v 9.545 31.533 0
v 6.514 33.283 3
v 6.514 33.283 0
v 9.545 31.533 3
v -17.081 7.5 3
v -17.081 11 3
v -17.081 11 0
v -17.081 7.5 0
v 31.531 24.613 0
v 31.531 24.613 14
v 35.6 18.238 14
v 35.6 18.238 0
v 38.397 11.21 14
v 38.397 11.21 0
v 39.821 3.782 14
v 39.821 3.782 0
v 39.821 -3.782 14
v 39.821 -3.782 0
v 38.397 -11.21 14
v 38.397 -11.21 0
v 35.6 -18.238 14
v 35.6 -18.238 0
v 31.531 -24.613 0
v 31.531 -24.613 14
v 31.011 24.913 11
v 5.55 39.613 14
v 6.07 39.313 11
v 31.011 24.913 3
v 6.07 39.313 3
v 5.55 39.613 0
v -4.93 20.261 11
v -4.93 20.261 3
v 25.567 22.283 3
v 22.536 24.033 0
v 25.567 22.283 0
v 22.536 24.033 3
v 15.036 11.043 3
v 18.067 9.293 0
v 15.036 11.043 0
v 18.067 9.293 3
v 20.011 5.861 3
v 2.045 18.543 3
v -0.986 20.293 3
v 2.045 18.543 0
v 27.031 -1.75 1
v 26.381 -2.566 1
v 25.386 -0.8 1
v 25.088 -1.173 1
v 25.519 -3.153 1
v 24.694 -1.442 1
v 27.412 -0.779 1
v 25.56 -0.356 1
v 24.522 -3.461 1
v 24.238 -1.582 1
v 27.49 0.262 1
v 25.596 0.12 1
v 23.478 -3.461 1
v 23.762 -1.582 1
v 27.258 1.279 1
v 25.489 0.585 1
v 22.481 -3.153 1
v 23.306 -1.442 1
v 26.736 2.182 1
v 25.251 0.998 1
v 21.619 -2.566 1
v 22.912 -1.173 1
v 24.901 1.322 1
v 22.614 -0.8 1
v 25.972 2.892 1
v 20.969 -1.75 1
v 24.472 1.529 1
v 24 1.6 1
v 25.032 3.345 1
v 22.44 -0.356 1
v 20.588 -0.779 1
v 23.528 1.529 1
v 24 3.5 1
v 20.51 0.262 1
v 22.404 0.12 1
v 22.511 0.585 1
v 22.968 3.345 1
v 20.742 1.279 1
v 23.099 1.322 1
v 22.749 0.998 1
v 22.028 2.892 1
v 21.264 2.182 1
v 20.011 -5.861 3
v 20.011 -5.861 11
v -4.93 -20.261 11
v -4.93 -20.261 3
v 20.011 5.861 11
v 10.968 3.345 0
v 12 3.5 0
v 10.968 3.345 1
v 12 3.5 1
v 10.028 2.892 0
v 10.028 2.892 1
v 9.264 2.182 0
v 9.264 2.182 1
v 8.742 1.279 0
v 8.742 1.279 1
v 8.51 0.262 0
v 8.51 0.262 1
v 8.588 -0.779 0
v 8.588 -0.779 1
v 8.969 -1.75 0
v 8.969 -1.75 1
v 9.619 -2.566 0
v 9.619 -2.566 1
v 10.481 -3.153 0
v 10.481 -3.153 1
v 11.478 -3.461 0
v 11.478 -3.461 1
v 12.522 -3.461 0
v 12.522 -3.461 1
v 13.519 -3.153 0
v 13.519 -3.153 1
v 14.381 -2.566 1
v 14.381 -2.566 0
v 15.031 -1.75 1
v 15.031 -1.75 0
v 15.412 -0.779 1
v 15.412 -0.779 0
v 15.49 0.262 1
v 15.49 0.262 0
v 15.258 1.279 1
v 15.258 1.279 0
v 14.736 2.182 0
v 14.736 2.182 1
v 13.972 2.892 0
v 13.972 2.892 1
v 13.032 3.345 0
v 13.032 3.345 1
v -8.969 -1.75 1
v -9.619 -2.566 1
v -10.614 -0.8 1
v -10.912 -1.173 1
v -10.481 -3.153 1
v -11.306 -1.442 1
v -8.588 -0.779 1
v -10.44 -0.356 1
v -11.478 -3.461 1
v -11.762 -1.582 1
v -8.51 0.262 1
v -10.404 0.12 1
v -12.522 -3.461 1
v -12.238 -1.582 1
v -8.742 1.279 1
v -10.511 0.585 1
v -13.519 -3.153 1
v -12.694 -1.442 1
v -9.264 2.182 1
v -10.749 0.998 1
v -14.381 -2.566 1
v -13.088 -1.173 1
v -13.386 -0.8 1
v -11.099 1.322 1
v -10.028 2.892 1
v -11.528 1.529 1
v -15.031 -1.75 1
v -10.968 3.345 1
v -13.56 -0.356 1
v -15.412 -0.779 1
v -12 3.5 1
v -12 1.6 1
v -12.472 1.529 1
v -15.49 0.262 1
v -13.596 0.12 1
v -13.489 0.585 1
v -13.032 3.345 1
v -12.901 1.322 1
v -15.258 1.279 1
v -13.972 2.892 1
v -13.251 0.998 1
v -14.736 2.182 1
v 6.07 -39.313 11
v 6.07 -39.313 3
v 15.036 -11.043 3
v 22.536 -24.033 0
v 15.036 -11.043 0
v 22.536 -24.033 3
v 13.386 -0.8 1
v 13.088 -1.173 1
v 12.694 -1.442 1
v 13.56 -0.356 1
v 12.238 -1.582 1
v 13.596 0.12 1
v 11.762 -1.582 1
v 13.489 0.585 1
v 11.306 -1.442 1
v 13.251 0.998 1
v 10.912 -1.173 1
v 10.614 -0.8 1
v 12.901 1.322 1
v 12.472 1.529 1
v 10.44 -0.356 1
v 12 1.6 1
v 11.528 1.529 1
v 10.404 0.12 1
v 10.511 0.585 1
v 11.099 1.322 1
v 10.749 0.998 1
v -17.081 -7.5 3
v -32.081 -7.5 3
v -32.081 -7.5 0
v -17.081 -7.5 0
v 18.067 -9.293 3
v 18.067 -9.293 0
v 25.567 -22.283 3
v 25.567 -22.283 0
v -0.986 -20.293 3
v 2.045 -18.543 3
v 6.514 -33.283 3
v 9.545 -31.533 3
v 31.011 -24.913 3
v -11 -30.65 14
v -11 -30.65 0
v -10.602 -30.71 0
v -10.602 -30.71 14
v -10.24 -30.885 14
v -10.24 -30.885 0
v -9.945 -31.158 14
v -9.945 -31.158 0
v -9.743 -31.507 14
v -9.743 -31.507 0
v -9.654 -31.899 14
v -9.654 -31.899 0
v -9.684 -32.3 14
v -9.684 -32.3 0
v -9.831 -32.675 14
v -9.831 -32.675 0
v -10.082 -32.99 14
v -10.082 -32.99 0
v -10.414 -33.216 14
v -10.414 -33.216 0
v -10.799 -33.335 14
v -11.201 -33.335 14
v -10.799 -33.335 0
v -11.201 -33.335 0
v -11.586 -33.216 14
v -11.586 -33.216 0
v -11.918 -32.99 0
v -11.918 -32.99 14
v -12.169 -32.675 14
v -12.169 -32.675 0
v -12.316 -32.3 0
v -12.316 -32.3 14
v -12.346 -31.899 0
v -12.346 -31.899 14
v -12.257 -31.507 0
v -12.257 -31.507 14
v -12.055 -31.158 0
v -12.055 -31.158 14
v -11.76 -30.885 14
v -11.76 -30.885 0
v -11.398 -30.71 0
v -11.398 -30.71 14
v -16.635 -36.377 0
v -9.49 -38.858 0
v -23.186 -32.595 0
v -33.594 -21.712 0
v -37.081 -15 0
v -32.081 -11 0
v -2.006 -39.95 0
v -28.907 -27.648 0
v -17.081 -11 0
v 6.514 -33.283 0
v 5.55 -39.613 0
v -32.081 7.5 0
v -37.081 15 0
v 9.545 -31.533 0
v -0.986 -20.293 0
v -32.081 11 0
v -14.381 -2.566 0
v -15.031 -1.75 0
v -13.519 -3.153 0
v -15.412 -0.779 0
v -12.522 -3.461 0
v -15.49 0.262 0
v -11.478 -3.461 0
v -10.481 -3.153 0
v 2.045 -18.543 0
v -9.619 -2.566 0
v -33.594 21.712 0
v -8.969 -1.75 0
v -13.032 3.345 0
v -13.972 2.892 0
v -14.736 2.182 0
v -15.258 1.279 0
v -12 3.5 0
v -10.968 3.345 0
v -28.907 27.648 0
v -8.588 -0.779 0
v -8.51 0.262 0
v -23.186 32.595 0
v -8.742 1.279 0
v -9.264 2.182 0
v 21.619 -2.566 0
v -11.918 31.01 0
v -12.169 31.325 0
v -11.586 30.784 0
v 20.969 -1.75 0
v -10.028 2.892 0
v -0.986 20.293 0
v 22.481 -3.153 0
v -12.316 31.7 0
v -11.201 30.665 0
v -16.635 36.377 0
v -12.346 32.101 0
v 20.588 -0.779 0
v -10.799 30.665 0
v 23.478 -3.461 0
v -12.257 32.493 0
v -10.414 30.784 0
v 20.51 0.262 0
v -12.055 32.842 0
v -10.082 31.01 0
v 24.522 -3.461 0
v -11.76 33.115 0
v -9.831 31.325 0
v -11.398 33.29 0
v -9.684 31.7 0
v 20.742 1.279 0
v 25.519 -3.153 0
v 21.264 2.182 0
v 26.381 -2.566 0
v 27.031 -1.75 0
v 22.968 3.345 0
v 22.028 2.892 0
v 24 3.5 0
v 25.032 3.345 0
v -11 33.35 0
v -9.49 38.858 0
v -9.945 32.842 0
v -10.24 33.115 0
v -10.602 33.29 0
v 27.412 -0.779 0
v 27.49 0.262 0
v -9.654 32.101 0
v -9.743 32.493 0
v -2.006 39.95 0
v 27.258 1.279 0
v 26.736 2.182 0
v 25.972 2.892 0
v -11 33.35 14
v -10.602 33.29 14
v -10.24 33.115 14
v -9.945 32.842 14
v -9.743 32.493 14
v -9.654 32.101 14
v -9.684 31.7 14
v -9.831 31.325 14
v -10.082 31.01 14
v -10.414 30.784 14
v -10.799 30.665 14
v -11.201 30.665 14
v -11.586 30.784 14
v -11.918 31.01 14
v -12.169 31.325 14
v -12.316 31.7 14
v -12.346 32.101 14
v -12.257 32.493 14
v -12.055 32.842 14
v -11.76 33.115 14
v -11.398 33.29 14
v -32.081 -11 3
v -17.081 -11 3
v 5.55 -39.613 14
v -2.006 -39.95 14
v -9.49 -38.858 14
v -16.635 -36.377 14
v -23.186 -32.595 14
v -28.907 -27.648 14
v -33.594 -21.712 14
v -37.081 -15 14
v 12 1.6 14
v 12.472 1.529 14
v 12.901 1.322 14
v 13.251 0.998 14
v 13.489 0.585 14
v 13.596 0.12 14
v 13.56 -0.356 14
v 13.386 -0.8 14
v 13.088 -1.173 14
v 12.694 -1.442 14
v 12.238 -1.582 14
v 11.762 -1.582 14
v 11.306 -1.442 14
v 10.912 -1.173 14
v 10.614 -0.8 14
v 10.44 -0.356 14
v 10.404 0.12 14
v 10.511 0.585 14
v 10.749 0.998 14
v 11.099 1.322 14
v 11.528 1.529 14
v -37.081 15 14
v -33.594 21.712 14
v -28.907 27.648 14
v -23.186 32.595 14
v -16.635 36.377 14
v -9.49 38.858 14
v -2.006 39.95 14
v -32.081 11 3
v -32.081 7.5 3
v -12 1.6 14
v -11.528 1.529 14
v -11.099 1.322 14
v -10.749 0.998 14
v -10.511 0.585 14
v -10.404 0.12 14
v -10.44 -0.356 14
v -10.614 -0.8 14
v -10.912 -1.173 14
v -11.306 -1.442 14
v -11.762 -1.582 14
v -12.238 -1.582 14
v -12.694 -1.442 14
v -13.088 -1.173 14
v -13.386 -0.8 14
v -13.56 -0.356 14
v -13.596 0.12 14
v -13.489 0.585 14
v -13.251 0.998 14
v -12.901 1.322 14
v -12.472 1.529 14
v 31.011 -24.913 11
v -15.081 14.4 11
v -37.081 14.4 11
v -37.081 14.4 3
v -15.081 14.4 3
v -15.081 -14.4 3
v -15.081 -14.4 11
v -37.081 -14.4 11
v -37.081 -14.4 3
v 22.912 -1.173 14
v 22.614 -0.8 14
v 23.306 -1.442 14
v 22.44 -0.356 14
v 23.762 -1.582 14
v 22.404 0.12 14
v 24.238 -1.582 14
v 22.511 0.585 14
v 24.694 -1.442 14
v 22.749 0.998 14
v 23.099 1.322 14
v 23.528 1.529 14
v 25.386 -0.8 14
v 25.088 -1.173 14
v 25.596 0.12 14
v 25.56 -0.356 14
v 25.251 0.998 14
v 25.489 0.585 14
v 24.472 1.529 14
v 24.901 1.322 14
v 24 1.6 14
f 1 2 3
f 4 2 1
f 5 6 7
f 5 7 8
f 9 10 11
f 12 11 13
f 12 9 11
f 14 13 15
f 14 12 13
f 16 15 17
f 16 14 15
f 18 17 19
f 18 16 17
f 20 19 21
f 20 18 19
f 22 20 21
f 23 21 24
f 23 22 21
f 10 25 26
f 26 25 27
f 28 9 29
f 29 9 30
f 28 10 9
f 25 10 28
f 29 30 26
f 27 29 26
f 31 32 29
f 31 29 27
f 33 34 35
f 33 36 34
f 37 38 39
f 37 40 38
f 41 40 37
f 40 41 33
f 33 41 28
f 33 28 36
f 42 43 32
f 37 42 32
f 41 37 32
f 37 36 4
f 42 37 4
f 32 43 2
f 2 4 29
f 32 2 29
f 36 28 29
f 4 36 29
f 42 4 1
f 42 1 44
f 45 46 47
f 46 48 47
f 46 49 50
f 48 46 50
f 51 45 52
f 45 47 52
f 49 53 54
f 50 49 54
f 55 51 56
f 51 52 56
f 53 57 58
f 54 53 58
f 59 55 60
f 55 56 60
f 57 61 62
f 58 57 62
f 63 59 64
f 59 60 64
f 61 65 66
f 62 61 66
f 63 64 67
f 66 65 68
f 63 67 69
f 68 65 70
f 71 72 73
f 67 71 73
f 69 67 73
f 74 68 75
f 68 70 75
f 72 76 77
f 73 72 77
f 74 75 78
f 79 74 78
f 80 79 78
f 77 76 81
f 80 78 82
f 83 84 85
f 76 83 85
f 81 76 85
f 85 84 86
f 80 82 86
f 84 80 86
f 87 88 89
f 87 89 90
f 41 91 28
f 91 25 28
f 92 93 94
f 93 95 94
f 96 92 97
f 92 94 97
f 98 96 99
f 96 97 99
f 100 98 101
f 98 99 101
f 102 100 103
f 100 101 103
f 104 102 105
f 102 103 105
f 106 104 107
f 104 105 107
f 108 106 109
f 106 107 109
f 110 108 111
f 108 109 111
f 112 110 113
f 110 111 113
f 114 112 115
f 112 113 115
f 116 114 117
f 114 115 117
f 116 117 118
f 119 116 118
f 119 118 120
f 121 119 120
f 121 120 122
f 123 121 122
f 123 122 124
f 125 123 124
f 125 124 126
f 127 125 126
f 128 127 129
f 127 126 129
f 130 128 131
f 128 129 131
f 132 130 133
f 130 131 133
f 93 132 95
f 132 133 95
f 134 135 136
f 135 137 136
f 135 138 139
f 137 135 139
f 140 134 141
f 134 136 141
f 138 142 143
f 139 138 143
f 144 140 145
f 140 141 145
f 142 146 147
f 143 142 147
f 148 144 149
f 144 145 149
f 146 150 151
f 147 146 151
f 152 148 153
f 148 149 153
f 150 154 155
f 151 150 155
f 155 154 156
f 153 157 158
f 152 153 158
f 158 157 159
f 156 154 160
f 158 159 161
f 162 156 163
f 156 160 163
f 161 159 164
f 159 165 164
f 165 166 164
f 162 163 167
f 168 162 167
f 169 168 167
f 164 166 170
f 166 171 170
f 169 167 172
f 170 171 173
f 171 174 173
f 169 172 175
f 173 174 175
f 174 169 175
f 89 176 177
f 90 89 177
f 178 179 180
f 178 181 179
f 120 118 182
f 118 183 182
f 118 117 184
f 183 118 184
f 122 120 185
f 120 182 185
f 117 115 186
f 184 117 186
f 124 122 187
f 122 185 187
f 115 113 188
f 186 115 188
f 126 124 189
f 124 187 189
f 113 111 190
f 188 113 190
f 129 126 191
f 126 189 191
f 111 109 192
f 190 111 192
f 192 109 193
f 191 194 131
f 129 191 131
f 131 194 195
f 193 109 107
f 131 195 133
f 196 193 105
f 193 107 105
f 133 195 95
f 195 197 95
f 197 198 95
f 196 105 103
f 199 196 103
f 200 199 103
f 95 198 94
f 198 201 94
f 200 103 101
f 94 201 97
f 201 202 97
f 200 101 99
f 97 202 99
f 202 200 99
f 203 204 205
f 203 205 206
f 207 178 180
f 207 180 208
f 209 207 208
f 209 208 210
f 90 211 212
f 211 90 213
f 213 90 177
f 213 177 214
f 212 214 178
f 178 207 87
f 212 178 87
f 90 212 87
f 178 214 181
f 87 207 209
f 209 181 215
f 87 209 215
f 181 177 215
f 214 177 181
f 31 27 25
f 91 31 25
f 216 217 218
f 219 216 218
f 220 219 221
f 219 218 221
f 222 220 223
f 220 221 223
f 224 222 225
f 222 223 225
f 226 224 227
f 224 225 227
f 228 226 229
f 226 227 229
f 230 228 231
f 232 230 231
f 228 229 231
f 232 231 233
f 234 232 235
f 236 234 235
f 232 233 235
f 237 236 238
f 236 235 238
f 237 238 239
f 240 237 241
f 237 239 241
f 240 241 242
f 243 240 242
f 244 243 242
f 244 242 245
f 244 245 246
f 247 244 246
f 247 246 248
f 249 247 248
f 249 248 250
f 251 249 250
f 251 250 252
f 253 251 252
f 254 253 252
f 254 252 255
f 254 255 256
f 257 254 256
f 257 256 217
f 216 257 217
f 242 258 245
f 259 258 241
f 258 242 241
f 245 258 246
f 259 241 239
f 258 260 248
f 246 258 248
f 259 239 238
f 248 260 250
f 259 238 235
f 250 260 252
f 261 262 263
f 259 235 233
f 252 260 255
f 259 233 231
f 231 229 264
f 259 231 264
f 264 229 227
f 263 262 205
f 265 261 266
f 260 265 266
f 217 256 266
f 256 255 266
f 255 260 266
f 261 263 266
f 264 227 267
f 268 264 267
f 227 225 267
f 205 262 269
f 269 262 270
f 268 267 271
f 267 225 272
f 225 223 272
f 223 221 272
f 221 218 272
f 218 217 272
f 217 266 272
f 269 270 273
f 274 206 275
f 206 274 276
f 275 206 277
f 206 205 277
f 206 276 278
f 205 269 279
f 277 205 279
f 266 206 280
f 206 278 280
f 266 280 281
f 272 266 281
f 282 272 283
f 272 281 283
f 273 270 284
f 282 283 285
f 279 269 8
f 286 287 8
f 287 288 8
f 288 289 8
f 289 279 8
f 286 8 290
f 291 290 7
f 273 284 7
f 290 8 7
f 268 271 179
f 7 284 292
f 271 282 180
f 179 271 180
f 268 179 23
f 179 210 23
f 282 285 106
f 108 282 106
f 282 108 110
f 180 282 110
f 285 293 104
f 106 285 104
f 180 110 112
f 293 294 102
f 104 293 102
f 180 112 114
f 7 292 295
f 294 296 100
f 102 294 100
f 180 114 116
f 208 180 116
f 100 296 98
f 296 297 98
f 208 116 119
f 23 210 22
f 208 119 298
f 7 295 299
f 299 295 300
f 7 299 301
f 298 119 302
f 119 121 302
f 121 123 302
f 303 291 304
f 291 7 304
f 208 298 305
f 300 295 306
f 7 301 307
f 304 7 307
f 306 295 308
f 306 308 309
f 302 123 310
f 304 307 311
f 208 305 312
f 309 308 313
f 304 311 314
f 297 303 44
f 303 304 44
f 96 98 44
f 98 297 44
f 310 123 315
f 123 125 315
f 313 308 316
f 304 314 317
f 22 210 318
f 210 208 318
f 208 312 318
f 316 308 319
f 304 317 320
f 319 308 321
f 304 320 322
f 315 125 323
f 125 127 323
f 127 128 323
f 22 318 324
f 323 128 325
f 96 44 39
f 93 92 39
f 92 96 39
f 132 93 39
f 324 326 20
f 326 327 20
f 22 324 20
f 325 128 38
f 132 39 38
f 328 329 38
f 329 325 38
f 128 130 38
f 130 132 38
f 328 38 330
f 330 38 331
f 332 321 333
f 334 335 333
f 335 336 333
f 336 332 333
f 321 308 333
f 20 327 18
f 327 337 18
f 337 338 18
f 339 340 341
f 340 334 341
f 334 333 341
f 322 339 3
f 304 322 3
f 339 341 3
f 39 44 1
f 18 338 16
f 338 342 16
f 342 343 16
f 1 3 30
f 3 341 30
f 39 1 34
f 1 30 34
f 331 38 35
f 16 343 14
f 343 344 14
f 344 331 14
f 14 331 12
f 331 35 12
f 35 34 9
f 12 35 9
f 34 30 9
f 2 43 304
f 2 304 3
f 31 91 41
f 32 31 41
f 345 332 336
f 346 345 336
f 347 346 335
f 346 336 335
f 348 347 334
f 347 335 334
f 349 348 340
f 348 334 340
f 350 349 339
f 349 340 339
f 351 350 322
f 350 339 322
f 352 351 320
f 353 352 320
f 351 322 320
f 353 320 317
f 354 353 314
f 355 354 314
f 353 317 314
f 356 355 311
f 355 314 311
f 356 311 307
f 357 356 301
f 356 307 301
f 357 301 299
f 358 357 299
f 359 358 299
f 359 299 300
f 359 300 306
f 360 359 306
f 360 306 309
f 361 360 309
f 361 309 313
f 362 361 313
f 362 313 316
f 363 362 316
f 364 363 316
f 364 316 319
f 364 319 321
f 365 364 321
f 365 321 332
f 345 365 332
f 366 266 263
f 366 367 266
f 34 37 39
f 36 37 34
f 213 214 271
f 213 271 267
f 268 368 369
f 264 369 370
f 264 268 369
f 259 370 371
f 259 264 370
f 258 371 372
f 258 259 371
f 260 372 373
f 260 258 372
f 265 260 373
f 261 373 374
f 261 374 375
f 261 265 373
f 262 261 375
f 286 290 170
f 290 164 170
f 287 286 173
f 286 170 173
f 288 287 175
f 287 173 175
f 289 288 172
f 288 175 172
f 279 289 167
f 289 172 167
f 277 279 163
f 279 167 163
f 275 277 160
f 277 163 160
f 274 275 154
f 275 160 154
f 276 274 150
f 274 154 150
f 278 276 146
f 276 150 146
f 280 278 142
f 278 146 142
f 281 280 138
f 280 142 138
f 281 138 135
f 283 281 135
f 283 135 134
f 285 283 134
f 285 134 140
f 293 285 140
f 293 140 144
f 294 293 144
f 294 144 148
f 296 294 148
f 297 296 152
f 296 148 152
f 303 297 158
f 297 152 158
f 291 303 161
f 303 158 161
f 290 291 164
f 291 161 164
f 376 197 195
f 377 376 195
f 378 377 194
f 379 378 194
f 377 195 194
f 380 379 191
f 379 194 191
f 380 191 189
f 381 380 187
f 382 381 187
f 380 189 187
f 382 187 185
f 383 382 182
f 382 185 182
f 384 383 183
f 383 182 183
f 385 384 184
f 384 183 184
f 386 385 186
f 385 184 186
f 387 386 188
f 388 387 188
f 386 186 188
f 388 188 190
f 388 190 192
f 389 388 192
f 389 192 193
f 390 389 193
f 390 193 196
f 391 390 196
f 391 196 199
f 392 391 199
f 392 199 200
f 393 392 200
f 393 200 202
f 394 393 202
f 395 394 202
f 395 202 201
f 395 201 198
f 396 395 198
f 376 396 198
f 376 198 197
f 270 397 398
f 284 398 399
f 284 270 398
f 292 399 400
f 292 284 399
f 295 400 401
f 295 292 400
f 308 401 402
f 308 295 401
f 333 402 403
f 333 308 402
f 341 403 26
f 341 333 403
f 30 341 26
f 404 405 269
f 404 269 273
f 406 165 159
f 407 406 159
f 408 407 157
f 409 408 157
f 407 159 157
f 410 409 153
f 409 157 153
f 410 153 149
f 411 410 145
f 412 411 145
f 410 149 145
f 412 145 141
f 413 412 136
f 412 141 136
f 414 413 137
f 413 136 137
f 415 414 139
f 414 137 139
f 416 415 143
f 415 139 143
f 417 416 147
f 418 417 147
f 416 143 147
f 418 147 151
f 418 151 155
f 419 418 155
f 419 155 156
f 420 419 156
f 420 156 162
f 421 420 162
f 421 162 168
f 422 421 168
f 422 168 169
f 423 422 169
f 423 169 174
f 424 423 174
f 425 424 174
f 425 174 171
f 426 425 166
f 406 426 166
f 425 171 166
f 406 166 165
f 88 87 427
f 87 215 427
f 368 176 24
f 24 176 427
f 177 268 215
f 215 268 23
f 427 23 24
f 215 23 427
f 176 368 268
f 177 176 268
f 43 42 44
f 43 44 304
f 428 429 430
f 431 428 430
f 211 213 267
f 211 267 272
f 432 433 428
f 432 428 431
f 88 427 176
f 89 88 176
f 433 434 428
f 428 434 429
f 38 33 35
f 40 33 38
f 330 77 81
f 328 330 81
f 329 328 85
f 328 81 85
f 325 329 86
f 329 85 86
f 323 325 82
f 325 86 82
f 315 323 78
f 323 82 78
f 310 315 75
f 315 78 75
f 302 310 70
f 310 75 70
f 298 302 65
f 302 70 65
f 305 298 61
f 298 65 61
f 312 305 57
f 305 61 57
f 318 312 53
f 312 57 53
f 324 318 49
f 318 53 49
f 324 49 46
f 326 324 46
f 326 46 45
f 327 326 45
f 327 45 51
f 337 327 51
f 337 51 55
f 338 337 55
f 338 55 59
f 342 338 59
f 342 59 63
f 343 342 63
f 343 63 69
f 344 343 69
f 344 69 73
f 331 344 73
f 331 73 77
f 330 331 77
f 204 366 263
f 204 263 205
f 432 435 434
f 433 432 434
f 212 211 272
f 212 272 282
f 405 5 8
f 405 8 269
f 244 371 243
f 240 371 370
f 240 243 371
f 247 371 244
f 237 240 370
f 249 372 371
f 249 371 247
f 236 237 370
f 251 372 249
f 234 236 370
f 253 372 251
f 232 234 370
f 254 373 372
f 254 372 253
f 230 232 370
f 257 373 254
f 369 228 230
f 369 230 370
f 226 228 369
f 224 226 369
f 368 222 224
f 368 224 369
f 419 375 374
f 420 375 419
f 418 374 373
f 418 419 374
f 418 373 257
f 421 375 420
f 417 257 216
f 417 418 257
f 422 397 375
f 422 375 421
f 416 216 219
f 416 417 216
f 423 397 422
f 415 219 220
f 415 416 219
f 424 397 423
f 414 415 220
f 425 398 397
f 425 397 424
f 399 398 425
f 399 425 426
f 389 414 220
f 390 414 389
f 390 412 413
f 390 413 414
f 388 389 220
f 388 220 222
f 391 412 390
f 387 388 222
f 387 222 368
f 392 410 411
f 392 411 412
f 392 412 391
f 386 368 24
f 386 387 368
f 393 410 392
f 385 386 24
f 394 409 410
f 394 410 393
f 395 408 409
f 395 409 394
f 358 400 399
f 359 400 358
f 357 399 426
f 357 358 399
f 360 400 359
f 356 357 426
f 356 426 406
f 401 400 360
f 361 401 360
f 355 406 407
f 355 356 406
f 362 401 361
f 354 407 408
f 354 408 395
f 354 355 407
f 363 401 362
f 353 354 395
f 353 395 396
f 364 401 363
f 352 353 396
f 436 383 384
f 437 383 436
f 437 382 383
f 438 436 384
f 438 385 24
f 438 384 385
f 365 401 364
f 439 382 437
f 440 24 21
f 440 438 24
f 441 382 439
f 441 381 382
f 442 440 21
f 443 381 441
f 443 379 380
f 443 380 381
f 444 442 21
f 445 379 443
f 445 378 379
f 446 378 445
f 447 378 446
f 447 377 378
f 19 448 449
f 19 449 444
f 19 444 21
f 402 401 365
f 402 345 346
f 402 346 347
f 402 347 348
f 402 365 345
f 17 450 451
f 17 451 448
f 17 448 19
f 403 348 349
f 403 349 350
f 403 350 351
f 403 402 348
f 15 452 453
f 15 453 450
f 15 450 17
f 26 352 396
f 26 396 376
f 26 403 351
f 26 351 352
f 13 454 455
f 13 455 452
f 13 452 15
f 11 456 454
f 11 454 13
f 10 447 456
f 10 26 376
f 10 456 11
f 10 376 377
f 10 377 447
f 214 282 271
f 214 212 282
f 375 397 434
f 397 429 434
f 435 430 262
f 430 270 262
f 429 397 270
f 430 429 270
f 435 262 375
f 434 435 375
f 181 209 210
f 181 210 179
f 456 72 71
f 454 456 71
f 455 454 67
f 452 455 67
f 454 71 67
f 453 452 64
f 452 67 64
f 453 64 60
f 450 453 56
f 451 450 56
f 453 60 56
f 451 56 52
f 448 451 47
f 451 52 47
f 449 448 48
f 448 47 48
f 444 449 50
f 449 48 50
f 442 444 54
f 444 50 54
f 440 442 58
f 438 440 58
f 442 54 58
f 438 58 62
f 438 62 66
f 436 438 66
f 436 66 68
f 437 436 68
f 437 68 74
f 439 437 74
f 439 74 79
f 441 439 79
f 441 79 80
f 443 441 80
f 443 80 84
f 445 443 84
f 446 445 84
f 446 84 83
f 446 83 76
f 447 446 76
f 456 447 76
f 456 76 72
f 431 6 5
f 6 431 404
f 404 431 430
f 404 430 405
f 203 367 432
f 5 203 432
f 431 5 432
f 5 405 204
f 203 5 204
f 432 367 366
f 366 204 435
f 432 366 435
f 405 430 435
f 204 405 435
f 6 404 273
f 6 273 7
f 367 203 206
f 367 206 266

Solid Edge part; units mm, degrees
sketch "Sketch1" plane through (0, 0, 0) normal (0, 0, 1) x (1, 0, 0)
  circle A0 centre (0, 0) radius 40
  dimension "D1" = 80
extrude "Protrusion1" add sketch "Sketch1" along normal blind 14
sketch "Sketch2" plane through (0, 0, 0) normal (0, 0, 1) x (1, 0, 0)
  line L0 (-37.081, 15) -> (-37.081, -15)
extrude "Cutout1" cut sketch "Sketch2" along normal through all material side at (-37.131, 0, 0)
sketch "Sketch3" plane through (-37.081, 0, 6) normal (-1, 0, 0) x (0, -1, 0)
  line L0 (14.4, 5) -> (-14.4, 5)
  line L1 (-14.4, 5) -> (-14.4, -3)
  line L2 (-14.4, -3) -> (14.4, -3)
  line L3 (14.4, -3) -> (14.4, 5)
extrude "Extrusionsausschnitt_5" cut sketch "Sketch3" against normal blind 22
sketch "Sketch4" plane through (-24.581, 0, 3) normal (0, 0, 1) x (0, -1, 0)
  line L0 (-7.5, 7.5) -> (-7.5, -7.5)
  line L1 (-7.5, -7.5) -> (-11, -7.5)
  line L2 (-11, -7.5) -> (-11, 7.5)
  line L3 (-11, 7.5) -> (-7.5, 7.5)
extrude "Cutout2" cut sketch "Sketch4" against normal through all
mirror "Mirror1" about plane through (0, 0, 0) normal (0, -1, 0) of "Cutout2"
pattern_circular "Pattern1" count 3 over 360 about axis through (0, 0, 0) along (0, 0, -1) of "Mirror1", "Cutout2", "Extrusionsausschnitt_5", "Cutout1"
hole "Bohrung_3" at (12, 0, 0) direction (0, 0, 1) diameter 3.2 end through all
hole "Hole1" at (24, 0, 0) direction (0, 0, 1) diameter 3.2 end through all
hole "Bohrung_5" at (-12, 0, 0) direction (0, 0, 1) diameter 3.2 end through all
hole "Bohrung_6" at (-11, 32, 0) direction (0, 0, 1) diameter 2.7 end through all
hole "Hole2" at (-11, -32, 0) direction (0, 0, 1) diameter 2.7 end through all
hole "Bohrung_8" at (-12, 0, 0) direction (0, 0, 1) diameter 7 depth 1
hole "Hole3" at (12, 0, 0) direction (0, 0, 1) diameter 7 depth 1
hole "Hole4" at (24, 0, 0) direction (0, 0, 1) diameter 7 depth 1
properties material "PLA(50%)"
